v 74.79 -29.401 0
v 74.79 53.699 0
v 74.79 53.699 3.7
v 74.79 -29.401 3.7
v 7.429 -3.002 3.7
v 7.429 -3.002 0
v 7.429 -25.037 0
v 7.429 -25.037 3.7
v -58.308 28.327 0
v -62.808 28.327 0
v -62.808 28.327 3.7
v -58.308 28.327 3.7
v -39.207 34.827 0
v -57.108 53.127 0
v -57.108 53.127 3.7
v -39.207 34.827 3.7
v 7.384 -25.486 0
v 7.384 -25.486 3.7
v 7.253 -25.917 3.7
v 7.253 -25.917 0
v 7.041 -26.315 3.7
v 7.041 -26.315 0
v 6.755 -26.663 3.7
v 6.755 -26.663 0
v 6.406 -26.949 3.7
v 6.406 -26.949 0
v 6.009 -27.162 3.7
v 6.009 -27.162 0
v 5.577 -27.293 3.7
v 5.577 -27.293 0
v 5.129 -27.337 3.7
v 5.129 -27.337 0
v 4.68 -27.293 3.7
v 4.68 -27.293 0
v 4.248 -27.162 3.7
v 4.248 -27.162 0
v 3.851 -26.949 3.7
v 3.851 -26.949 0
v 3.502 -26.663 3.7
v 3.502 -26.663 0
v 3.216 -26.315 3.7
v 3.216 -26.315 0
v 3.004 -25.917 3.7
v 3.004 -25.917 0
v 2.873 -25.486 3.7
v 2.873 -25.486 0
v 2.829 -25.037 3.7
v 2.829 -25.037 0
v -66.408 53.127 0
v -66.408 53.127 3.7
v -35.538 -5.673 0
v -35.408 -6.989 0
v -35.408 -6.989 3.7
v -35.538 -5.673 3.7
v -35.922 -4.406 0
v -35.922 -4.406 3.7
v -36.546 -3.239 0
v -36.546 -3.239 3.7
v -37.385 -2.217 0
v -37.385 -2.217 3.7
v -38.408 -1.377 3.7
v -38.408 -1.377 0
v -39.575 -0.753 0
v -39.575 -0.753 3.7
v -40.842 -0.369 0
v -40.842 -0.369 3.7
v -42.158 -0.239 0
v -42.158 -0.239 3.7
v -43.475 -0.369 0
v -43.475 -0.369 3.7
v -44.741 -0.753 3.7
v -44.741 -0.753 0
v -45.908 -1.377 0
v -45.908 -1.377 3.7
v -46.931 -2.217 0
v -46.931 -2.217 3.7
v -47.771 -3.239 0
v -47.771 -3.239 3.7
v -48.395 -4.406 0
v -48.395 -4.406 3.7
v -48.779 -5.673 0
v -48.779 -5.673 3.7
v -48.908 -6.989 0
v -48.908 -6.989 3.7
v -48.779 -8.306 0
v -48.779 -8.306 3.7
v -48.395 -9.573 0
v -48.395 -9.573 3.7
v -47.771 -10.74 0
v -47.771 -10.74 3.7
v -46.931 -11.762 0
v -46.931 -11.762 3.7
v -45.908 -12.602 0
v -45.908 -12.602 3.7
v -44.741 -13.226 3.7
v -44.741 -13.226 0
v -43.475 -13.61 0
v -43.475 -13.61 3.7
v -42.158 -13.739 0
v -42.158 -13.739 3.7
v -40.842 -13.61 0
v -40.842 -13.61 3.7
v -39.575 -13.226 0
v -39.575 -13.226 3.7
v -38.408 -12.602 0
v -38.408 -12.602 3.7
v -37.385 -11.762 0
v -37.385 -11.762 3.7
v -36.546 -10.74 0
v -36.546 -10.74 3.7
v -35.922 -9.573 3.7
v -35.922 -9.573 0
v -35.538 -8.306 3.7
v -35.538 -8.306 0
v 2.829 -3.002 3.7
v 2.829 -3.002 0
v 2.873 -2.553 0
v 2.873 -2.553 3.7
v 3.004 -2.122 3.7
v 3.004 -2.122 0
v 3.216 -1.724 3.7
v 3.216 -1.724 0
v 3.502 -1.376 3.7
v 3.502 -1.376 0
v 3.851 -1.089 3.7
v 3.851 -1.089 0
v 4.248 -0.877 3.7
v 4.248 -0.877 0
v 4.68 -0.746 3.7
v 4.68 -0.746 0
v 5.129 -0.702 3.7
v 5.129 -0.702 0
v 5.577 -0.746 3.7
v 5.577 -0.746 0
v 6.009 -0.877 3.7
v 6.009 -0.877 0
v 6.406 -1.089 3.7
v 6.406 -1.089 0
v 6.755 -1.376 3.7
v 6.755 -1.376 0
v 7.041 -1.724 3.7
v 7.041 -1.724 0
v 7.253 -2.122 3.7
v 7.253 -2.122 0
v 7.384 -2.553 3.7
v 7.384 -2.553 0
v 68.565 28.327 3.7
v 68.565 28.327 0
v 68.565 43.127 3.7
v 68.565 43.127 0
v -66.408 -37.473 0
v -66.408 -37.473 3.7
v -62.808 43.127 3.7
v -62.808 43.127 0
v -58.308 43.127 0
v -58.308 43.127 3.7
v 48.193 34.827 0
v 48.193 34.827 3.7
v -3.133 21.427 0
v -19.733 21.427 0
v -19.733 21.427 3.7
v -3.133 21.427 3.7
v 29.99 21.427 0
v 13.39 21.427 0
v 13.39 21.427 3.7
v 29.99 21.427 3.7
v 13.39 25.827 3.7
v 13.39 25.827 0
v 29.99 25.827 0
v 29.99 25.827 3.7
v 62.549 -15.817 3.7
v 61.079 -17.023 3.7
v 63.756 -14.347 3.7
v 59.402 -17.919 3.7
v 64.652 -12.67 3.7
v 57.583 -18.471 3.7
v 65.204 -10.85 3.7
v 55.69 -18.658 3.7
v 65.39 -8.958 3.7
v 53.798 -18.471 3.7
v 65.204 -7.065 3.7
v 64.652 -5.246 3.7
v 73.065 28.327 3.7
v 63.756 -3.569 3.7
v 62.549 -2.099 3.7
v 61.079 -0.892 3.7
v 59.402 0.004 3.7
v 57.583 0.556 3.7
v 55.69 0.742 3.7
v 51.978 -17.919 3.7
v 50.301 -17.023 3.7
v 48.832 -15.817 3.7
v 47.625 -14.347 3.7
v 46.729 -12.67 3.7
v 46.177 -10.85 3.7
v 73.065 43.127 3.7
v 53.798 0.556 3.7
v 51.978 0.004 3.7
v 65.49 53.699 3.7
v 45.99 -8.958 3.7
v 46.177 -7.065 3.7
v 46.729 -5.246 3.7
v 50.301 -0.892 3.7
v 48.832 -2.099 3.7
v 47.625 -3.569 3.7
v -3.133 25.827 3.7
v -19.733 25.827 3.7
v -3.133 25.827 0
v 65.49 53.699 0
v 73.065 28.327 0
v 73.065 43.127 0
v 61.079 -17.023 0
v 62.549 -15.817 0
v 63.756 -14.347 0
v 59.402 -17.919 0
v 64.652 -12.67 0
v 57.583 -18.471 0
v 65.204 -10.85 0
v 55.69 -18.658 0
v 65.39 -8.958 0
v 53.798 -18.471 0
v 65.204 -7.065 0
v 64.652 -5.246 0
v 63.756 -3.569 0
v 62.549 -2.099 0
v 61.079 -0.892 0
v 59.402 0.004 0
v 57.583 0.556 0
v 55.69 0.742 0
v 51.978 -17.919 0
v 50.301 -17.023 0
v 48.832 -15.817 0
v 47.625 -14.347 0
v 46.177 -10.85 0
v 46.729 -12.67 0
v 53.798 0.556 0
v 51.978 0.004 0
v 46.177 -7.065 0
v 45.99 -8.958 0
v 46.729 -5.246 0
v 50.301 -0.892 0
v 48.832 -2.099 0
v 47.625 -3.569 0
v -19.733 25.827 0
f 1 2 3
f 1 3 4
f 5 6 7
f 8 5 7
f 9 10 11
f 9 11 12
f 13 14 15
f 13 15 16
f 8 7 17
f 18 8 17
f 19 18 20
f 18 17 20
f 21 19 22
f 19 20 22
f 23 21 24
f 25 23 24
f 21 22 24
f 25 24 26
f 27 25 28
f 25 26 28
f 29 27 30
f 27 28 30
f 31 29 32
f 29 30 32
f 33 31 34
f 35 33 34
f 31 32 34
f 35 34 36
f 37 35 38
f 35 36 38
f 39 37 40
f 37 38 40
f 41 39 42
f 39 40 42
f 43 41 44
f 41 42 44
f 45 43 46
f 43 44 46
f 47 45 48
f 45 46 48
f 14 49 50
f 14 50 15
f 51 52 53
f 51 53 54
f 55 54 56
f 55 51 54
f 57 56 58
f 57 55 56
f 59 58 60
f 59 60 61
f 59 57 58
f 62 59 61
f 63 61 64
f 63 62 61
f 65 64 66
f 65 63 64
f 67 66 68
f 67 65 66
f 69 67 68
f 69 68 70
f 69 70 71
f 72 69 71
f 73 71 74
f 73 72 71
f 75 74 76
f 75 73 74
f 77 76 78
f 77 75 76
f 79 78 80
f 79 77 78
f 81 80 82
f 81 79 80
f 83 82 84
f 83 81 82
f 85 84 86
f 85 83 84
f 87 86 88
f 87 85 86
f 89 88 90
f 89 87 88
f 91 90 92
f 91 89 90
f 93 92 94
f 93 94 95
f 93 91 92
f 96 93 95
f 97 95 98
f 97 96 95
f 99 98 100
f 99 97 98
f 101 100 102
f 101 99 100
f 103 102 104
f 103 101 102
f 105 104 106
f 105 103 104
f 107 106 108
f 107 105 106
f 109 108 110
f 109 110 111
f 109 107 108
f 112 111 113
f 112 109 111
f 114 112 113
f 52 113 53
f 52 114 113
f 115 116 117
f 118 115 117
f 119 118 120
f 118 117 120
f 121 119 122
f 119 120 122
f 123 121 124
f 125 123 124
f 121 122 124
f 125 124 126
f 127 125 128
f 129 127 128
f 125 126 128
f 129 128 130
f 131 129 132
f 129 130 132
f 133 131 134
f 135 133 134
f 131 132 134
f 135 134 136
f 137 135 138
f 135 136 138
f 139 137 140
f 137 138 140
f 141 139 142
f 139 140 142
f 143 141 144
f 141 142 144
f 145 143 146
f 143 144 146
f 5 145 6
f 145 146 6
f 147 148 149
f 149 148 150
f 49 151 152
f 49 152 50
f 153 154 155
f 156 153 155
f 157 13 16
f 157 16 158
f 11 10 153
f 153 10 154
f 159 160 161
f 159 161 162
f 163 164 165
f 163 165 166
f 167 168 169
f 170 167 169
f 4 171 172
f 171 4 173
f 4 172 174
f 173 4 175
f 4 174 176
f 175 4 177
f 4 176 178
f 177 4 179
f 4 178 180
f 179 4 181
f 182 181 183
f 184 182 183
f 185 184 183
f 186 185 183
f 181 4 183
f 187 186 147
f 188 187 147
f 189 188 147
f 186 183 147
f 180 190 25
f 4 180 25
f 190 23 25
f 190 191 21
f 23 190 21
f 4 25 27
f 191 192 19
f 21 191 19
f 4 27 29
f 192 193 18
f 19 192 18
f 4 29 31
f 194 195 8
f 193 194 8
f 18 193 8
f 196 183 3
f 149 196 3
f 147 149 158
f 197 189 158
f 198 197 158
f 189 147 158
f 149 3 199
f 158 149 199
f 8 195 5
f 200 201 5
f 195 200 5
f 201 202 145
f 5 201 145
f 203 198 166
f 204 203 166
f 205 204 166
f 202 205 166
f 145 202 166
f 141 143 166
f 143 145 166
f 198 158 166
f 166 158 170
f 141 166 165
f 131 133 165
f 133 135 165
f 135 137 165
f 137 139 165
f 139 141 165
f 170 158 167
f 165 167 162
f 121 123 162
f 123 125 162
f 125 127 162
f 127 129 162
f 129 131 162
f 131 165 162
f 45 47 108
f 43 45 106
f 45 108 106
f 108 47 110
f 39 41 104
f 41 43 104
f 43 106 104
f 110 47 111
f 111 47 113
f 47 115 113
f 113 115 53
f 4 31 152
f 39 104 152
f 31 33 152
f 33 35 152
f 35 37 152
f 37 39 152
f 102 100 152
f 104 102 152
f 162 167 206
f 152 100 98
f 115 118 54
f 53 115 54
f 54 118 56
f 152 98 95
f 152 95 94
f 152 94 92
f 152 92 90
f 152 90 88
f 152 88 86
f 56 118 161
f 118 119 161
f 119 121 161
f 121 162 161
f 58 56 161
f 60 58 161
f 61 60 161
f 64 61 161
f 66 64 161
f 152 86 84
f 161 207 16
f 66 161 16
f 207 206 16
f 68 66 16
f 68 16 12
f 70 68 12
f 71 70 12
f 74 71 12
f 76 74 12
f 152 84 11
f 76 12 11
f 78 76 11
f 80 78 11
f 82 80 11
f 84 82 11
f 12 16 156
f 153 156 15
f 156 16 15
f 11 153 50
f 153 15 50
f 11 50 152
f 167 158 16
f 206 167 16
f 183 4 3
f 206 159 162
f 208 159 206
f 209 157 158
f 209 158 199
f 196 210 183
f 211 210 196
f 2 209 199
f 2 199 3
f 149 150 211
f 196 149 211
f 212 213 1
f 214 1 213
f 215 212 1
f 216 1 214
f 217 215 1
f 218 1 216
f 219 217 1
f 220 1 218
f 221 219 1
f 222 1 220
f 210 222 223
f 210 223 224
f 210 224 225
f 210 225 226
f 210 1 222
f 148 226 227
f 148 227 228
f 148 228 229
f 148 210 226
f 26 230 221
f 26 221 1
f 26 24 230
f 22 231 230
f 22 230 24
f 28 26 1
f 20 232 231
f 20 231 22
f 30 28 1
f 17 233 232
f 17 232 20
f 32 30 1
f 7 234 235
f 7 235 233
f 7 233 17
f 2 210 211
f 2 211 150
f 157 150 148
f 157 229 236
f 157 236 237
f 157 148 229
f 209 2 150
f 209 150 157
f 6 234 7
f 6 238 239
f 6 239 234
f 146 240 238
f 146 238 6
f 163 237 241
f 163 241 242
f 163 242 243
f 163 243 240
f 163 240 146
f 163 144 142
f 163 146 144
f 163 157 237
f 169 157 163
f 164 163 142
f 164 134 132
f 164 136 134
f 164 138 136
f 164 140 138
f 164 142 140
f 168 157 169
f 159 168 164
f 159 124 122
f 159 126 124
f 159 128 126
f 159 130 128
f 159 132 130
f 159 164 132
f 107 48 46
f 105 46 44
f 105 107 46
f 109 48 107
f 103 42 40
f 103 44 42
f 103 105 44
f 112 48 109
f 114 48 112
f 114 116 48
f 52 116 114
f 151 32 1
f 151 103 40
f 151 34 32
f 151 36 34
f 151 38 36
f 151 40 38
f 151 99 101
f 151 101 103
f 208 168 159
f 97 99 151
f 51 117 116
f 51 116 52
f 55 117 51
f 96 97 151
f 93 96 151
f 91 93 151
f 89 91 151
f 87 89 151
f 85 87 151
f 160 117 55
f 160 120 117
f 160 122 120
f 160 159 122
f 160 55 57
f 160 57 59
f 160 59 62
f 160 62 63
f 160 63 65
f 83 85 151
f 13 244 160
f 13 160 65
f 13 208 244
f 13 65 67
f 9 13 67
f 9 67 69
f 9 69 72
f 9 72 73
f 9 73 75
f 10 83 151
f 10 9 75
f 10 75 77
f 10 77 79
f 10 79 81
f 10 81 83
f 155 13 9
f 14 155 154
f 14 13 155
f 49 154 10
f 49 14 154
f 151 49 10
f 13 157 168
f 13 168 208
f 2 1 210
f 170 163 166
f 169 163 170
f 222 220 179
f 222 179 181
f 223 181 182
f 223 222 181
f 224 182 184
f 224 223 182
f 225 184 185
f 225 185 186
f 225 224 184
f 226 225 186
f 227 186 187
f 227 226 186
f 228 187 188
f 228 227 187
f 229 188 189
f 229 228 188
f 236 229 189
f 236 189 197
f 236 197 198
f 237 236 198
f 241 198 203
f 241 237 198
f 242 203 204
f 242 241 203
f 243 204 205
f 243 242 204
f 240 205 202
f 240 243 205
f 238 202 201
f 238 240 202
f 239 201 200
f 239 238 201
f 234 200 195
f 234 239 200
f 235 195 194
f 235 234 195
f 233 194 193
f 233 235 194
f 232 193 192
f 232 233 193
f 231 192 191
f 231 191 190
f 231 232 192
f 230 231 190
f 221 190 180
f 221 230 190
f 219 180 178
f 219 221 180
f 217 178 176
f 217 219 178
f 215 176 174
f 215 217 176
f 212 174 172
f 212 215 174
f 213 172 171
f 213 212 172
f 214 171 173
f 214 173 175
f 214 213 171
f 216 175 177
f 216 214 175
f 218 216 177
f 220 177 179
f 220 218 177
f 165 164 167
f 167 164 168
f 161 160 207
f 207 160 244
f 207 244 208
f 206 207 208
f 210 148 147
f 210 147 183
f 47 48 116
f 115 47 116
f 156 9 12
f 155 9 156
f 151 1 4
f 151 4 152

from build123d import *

# Parameters (mm, degrees)
SKETCH2_R           = 9.7
SKETCH2_R_2         = 6.75
SKETCH2_W           = 4.5
SKETCH2_H           = 14.8
SKETCH2_W_2         = 16.6
SKETCH2_H_2         = 4.4
BOSS_EXTRUDE1_DEPTH = 3.7


with BuildPart() as part:
    # Sketch2 → Boss-Extrude1 (new body)
    with BuildSketch(Plane.XY):
        Polygon((-66.408376963, -37.473298429), (-66.408376963, 53.126701571), (-57.108376963, 53.126701571), (-39.206701064, 34.826701571), (48.193298936, 34.826701571), (65.490462758, 53.699118578), (74.790462758, 53.699118578), (74.790462758, -29.400881422), align=None)
        with Locations((55.690462758, -8.957731732)):
            Circle(SKETCH2_R, mode=Mode.SUBTRACT)
        with Locations((-42.158376963, -6.98947646)):
            Circle(SKETCH2_R_2, mode=Mode.SUBTRACT)
        with Locations((-60.558376963, 35.726701571)):
            Rectangle(SKETCH2_W, SKETCH2_H, mode=Mode.SUBTRACT)
        with Locations((70.815419874, 35.726701571)):
            Rectangle(SKETCH2_W, SKETCH2_H, mode=Mode.SUBTRACT)
        with Locations((-11.433419848, 23.626701571)):
            Rectangle(SKETCH2_W_2, SKETCH2_H_2, mode=Mode.SUBTRACT)
        with Locations((21.690462758, 23.626701571)):
            Rectangle(SKETCH2_W_2, SKETCH2_H_2, mode=Mode.SUBTRACT)
        with BuildLine():
            Line((7.428521455, -3.001867406), (7.428521455, -25.037089926))
            ThreePointArc((7.428521455, -25.037089926), (5.128521455, -27.337089926), (2.828521455, -25.037089926))
            Line((2.828521455, -25.037089926), (2.828521455, -3.001867406))
            ThreePointArc((2.828521455, -3.001867406), (5.128521455, -0.701867406), (7.428521455, -3.001867406))
        make_face(mode=Mode.SUBTRACT)
    extrude(amount=BOSS_EXTRUDE1_DEPTH)


solid = part.part
